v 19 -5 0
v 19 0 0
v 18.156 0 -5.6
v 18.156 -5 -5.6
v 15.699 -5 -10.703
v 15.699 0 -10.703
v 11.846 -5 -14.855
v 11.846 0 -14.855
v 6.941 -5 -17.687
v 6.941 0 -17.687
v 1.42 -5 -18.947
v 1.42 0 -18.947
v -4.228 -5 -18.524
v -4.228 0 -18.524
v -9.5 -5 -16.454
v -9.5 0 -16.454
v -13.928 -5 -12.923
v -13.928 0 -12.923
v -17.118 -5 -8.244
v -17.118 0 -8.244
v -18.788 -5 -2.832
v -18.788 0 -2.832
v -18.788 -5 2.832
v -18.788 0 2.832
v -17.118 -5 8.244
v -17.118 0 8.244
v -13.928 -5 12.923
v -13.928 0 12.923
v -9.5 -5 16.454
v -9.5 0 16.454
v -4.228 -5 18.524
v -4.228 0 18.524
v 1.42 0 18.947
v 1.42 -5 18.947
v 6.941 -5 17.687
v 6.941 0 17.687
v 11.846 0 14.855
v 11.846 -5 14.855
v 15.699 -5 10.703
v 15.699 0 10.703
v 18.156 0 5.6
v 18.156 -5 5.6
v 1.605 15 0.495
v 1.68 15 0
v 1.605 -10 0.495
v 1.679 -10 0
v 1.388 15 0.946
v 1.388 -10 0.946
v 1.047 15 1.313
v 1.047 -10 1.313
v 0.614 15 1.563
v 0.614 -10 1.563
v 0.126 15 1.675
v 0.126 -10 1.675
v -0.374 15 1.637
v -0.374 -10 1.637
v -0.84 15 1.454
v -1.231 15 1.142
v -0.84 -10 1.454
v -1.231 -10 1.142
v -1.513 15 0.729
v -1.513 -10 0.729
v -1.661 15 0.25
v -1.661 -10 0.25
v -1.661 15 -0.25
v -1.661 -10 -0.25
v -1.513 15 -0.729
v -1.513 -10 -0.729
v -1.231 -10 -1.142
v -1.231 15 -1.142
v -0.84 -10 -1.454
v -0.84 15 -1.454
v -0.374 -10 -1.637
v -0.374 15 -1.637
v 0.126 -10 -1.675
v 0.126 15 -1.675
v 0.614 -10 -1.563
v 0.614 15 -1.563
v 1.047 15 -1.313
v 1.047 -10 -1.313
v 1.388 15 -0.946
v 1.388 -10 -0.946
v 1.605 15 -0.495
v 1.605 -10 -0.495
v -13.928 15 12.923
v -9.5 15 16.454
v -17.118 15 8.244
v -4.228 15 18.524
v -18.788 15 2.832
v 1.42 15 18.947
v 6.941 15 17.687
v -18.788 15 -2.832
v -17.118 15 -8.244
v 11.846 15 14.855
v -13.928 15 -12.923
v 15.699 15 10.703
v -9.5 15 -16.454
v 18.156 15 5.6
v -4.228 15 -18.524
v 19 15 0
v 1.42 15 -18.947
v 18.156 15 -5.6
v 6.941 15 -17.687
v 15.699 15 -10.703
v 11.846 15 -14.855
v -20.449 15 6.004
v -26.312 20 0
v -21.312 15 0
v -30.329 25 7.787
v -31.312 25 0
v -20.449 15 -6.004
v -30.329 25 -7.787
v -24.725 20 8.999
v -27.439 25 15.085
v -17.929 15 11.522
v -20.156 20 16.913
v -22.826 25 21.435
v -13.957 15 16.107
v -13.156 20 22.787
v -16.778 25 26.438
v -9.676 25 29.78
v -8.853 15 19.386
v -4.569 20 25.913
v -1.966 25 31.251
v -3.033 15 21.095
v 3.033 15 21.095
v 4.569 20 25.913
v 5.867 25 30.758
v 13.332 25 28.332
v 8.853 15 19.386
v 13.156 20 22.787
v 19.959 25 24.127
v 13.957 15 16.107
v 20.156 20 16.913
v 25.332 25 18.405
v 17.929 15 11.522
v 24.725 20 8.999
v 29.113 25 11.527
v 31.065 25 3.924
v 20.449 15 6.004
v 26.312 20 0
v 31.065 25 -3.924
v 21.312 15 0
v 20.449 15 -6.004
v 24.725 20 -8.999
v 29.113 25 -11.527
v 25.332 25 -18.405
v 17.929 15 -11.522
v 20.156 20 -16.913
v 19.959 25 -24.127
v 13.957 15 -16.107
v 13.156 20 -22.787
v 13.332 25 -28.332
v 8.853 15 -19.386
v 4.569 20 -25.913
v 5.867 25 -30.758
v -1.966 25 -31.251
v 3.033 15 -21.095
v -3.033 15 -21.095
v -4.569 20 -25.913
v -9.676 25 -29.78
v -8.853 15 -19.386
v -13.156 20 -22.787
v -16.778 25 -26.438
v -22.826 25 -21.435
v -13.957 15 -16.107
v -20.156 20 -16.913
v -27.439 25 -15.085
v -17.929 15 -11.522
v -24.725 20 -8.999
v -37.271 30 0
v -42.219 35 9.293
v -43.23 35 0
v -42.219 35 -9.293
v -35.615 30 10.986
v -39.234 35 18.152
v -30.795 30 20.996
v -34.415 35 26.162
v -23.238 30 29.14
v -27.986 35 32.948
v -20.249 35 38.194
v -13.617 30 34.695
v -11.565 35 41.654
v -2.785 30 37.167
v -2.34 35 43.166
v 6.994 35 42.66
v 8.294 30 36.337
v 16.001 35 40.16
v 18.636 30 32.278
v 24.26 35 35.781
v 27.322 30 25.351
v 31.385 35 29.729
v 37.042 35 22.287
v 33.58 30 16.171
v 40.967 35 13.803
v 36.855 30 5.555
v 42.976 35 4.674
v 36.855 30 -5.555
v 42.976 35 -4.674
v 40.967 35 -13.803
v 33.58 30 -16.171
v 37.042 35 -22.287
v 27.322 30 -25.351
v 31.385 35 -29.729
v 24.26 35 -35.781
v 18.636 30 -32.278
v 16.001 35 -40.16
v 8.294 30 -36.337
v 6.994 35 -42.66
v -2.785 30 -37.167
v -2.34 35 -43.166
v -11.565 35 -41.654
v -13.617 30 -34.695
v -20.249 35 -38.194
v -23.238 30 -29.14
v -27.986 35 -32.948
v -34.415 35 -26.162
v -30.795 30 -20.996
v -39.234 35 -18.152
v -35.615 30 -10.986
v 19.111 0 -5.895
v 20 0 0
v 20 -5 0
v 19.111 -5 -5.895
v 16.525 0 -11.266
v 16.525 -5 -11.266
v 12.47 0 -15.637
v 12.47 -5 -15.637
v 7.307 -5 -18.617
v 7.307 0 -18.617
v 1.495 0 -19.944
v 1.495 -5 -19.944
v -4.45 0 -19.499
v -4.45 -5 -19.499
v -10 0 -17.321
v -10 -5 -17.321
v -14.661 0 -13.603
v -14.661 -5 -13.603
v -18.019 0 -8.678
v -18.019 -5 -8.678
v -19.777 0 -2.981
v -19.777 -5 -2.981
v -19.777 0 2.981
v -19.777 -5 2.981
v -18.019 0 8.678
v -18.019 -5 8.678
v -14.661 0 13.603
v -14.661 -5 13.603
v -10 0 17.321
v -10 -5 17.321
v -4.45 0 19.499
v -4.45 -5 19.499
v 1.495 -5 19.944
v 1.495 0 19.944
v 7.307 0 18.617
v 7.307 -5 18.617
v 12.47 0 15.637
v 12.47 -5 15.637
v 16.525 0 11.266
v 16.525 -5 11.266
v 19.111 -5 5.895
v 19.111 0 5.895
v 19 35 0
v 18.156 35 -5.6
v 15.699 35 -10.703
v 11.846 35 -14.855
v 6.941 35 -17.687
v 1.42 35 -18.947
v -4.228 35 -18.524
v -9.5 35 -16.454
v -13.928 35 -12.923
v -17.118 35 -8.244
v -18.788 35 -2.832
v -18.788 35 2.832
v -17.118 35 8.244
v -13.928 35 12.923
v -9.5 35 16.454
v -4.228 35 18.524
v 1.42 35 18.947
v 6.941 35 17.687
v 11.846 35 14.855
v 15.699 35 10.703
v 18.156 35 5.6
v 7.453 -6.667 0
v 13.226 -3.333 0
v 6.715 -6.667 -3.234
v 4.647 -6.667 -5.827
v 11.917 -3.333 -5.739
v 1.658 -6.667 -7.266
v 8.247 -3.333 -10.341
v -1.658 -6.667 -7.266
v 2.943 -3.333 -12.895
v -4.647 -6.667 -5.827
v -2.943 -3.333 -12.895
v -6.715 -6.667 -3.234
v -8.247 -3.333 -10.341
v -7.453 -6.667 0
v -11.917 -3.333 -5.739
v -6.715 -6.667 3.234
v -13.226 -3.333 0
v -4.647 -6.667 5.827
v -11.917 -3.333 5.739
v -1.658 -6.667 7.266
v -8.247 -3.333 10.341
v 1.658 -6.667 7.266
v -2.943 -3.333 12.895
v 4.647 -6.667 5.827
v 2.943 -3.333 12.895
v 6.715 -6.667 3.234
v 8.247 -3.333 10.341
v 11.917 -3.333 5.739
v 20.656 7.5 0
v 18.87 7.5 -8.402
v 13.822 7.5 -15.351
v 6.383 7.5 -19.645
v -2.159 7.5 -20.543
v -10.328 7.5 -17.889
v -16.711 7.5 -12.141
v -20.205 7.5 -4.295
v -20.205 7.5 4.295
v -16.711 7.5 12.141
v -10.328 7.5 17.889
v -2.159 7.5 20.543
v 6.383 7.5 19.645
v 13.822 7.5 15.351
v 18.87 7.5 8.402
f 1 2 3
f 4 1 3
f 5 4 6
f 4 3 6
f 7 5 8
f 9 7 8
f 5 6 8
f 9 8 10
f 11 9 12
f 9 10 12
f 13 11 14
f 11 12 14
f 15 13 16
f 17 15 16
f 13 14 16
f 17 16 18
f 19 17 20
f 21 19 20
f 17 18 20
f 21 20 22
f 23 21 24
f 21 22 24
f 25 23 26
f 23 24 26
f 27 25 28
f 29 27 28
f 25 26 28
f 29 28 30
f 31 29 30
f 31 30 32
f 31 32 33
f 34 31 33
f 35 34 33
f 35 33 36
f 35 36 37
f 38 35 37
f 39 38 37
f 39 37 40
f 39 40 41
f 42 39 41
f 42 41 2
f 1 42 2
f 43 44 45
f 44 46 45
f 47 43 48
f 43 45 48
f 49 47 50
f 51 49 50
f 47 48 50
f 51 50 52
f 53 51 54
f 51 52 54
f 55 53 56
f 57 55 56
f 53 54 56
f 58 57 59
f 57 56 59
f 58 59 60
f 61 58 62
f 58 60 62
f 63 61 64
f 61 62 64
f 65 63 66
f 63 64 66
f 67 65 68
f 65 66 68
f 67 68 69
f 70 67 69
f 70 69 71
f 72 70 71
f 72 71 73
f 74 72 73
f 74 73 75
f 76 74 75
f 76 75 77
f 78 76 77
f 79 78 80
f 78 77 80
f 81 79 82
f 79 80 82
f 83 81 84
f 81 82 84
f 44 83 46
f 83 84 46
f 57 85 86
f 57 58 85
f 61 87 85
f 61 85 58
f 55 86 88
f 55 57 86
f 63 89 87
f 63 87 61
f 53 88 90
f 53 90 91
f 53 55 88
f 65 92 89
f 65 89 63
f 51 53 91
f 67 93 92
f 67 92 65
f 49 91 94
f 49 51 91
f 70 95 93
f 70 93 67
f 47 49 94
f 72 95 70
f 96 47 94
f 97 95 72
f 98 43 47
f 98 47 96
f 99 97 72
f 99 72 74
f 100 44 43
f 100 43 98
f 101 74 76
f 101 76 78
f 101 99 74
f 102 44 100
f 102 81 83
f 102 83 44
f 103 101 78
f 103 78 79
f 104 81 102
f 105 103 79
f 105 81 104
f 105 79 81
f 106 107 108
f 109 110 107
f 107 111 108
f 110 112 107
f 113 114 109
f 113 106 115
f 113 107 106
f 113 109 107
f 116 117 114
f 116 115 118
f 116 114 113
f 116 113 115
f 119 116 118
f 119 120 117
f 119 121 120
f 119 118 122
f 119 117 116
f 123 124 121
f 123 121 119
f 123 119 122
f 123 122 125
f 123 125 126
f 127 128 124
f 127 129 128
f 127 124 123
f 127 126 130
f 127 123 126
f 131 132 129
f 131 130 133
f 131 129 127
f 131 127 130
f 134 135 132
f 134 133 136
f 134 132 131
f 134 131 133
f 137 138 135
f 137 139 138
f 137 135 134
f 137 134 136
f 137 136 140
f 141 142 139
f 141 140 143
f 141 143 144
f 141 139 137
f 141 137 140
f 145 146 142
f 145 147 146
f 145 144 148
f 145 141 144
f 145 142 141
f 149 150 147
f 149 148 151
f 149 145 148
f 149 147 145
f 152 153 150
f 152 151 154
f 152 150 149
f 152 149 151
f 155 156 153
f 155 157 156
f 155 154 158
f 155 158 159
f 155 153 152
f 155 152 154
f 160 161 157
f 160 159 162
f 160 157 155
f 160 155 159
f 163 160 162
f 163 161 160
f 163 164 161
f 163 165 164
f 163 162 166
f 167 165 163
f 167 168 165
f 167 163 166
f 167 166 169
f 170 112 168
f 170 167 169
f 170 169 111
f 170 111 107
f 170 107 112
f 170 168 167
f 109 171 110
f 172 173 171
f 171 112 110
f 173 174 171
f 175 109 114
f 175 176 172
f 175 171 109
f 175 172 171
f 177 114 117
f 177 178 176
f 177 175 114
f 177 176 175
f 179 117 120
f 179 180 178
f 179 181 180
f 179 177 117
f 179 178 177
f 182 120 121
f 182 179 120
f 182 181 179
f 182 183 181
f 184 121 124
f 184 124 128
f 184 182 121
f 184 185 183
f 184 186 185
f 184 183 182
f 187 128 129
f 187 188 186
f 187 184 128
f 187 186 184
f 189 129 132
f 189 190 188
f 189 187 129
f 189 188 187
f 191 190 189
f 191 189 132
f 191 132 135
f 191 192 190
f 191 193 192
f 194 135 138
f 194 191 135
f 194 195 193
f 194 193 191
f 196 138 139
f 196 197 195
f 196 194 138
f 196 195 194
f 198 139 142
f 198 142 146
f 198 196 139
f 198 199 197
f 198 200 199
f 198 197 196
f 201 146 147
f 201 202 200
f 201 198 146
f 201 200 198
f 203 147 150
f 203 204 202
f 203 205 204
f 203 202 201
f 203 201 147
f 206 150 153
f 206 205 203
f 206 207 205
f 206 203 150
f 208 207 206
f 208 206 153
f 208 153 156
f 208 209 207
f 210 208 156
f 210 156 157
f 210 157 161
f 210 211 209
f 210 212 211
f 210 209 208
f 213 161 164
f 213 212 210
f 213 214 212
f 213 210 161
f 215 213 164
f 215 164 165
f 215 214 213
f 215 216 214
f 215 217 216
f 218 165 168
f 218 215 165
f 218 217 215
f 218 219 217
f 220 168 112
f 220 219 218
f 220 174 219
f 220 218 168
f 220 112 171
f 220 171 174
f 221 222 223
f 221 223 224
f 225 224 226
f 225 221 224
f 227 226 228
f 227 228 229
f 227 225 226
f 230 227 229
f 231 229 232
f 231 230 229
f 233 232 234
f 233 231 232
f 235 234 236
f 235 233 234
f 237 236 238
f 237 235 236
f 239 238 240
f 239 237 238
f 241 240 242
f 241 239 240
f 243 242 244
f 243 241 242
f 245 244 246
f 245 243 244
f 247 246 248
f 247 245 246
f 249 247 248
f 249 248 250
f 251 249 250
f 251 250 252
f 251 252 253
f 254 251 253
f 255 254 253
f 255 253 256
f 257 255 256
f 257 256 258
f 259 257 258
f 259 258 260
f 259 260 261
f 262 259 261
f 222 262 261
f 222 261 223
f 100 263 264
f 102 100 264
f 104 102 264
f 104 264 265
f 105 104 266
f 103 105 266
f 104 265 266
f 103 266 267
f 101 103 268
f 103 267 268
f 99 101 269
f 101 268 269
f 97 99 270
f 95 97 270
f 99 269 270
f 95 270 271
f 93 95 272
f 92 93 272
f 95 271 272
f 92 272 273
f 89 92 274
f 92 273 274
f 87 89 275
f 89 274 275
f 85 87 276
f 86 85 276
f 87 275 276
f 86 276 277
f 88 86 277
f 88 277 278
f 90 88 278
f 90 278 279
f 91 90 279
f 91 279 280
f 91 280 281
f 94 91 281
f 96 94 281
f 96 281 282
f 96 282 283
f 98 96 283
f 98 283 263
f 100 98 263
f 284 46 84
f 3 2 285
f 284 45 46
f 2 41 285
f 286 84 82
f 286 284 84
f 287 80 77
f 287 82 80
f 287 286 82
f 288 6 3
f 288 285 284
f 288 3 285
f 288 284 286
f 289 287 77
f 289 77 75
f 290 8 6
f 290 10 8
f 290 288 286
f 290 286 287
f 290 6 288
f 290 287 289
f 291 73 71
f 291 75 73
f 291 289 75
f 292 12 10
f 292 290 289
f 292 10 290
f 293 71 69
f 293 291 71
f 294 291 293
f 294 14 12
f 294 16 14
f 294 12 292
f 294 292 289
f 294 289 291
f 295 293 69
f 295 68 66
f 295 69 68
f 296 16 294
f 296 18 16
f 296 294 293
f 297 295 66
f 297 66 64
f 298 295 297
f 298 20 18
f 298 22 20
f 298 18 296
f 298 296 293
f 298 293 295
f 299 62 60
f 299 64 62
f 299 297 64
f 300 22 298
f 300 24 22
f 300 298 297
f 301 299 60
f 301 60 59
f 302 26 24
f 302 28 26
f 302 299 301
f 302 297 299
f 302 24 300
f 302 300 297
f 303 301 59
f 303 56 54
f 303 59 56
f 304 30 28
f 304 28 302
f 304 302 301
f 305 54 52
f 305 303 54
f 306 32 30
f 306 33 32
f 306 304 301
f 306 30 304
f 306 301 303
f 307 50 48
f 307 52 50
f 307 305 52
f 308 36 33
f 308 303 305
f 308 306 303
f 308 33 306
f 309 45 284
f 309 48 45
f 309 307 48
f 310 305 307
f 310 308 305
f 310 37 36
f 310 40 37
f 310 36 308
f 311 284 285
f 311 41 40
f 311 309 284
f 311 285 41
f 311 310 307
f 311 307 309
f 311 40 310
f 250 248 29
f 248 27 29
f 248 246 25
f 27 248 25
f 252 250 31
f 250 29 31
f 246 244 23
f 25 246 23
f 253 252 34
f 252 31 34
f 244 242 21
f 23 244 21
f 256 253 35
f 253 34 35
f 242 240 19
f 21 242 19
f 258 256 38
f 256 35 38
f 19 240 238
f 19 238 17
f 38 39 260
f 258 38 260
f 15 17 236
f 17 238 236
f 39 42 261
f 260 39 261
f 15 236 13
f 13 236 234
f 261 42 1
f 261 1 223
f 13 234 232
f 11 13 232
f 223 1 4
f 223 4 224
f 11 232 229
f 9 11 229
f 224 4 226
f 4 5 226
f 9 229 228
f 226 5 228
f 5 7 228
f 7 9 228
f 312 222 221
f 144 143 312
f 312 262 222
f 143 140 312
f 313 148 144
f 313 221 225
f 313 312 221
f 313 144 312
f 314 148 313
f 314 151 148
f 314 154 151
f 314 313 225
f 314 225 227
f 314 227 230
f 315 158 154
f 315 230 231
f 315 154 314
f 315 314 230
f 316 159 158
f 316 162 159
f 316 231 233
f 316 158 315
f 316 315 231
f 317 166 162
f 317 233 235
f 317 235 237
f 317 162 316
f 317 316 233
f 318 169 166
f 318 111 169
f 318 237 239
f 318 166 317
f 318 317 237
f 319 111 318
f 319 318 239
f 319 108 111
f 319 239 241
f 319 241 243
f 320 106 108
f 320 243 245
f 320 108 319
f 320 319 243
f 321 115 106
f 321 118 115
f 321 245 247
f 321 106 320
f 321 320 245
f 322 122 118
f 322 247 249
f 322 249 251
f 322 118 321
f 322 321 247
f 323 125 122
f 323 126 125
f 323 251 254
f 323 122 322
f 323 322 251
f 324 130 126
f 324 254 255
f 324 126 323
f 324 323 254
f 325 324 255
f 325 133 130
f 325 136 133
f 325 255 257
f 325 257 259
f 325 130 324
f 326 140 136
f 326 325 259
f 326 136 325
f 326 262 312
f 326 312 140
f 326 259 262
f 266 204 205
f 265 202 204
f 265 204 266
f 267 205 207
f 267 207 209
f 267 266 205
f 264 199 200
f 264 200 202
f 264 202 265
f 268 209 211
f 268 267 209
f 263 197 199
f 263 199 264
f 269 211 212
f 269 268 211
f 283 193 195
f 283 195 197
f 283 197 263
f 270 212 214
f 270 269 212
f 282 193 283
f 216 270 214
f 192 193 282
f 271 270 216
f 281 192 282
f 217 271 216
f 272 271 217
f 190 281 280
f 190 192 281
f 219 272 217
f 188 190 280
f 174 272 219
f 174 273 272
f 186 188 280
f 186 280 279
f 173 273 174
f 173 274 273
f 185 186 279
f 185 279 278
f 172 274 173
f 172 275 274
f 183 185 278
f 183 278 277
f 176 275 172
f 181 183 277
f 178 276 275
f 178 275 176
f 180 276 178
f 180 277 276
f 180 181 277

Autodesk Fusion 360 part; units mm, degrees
sketch "Sketch1" plane through (0, 0, 0) normal (0, 1, 0) x (1, 0, 0)
  circle A0 centre (0, 0) radius 18.5
  circle A1 centre (0, 0) radius 20
  dimension "d1" = 37
  dimension "d2" = 1.5
extrude "Extrude1" add sketch "Sketch1" along normal blind 15 draft 5 and the other way blind 5
sketch "Sketch2" plane through (0, 15, 0) normal (0, 1, 0) x (-1, 0, 0)
  circle A0 centre (0, 0) radius 17.1877
  circle A1 centre (0, 0) radius 21.3123
  circle A2 centre (0, 0) radius 17.1877
  circle A3 centre (0, 0) radius 21.3123
extrude "Extrude2" add sketch "Sketch2" along normal blind 10 draft 45
sketch "Sketch3" plane through (0, 25, 0) normal (0, 1, 0) x (-1, 0, 0)
  circle A0 centre (0, 0) radius 7.1877
  circle A1 centre (0, 0) radius 31.3123
  circle A2 centre (0, 0) radius 12.1877
  circle A3 centre (0, 0) radius 26.3123
extrude "Extrude3" add sketch "Sketch3" along normal blind 10 draft 50 contours A1 | A3
sketch "Sketch4" plane through (0, 25, 0) normal (0, 1, 0) x (-1, 0, 0)
  circle A0 centre (0, 0) radius 12.1877
  circle A1 centre (0, 0) radius 7.1877
  circle A2 centre (0, 0) radius 7.1877
extrude "Extrude4" cut sketch "Sketch4" along normal blind 60 contours A1 A2
sketch "Sketch5" plane through (0, 35, 0) normal (0, 1, 0) x (-1, 0, 0)
  circle A0 centre (0, 0) radius 7.1877
  circle A1 centre (0, 0) radius 43.2299
  circle A2 centre (0, 0) radius 35
extrude "Extrude5" cut sketch "Sketch5" against normal blind 20 draft -50 contours A2
ref_plane "WorkPlane1" through (0, 15, 0) normal (0, 1, 0) x (0, 0, 1)
sketch "Sketch6" plane through (0, 15, 0) normal (0, 1, 0) x (1, 0, 0)
  circle A0 centre (0, 0) radius 19
  dimension "d16" = 38
extrude "Extrude6" cut sketch "Sketch6" along normal blind -70 and the other way blind -65
sketch "Sketch7" plane through (0, 15, 0) normal (0, 1, 0) x (1, 0, 0)
  circle A0 centre (0, 0) radius 19
extrude "Extrude7" add sketch "Sketch7" against normal blind 15
sketch "Sketch8" plane through (0, 0, 0) normal (0, -1, 0) x (1, 0, 0)
  circle A0 centre (0, 0) radius 19
  circle A1 centre (0, 0) radius 19
extrude "Extrude8" add sketch "Sketch8" along normal blind 10 draft -60
sketch "Sketch9" plane through (0, -10, 0) normal (0, -1, 0) x (1, 0, 0)
  circle A0 centre (0, 0) radius 1.6795
  circle A1 centre (0, 0) radius 1.6795
  dimension "d27" = 3.359
extrude "Extrude9" cut sketch "Sketch9" against normal blind 60
